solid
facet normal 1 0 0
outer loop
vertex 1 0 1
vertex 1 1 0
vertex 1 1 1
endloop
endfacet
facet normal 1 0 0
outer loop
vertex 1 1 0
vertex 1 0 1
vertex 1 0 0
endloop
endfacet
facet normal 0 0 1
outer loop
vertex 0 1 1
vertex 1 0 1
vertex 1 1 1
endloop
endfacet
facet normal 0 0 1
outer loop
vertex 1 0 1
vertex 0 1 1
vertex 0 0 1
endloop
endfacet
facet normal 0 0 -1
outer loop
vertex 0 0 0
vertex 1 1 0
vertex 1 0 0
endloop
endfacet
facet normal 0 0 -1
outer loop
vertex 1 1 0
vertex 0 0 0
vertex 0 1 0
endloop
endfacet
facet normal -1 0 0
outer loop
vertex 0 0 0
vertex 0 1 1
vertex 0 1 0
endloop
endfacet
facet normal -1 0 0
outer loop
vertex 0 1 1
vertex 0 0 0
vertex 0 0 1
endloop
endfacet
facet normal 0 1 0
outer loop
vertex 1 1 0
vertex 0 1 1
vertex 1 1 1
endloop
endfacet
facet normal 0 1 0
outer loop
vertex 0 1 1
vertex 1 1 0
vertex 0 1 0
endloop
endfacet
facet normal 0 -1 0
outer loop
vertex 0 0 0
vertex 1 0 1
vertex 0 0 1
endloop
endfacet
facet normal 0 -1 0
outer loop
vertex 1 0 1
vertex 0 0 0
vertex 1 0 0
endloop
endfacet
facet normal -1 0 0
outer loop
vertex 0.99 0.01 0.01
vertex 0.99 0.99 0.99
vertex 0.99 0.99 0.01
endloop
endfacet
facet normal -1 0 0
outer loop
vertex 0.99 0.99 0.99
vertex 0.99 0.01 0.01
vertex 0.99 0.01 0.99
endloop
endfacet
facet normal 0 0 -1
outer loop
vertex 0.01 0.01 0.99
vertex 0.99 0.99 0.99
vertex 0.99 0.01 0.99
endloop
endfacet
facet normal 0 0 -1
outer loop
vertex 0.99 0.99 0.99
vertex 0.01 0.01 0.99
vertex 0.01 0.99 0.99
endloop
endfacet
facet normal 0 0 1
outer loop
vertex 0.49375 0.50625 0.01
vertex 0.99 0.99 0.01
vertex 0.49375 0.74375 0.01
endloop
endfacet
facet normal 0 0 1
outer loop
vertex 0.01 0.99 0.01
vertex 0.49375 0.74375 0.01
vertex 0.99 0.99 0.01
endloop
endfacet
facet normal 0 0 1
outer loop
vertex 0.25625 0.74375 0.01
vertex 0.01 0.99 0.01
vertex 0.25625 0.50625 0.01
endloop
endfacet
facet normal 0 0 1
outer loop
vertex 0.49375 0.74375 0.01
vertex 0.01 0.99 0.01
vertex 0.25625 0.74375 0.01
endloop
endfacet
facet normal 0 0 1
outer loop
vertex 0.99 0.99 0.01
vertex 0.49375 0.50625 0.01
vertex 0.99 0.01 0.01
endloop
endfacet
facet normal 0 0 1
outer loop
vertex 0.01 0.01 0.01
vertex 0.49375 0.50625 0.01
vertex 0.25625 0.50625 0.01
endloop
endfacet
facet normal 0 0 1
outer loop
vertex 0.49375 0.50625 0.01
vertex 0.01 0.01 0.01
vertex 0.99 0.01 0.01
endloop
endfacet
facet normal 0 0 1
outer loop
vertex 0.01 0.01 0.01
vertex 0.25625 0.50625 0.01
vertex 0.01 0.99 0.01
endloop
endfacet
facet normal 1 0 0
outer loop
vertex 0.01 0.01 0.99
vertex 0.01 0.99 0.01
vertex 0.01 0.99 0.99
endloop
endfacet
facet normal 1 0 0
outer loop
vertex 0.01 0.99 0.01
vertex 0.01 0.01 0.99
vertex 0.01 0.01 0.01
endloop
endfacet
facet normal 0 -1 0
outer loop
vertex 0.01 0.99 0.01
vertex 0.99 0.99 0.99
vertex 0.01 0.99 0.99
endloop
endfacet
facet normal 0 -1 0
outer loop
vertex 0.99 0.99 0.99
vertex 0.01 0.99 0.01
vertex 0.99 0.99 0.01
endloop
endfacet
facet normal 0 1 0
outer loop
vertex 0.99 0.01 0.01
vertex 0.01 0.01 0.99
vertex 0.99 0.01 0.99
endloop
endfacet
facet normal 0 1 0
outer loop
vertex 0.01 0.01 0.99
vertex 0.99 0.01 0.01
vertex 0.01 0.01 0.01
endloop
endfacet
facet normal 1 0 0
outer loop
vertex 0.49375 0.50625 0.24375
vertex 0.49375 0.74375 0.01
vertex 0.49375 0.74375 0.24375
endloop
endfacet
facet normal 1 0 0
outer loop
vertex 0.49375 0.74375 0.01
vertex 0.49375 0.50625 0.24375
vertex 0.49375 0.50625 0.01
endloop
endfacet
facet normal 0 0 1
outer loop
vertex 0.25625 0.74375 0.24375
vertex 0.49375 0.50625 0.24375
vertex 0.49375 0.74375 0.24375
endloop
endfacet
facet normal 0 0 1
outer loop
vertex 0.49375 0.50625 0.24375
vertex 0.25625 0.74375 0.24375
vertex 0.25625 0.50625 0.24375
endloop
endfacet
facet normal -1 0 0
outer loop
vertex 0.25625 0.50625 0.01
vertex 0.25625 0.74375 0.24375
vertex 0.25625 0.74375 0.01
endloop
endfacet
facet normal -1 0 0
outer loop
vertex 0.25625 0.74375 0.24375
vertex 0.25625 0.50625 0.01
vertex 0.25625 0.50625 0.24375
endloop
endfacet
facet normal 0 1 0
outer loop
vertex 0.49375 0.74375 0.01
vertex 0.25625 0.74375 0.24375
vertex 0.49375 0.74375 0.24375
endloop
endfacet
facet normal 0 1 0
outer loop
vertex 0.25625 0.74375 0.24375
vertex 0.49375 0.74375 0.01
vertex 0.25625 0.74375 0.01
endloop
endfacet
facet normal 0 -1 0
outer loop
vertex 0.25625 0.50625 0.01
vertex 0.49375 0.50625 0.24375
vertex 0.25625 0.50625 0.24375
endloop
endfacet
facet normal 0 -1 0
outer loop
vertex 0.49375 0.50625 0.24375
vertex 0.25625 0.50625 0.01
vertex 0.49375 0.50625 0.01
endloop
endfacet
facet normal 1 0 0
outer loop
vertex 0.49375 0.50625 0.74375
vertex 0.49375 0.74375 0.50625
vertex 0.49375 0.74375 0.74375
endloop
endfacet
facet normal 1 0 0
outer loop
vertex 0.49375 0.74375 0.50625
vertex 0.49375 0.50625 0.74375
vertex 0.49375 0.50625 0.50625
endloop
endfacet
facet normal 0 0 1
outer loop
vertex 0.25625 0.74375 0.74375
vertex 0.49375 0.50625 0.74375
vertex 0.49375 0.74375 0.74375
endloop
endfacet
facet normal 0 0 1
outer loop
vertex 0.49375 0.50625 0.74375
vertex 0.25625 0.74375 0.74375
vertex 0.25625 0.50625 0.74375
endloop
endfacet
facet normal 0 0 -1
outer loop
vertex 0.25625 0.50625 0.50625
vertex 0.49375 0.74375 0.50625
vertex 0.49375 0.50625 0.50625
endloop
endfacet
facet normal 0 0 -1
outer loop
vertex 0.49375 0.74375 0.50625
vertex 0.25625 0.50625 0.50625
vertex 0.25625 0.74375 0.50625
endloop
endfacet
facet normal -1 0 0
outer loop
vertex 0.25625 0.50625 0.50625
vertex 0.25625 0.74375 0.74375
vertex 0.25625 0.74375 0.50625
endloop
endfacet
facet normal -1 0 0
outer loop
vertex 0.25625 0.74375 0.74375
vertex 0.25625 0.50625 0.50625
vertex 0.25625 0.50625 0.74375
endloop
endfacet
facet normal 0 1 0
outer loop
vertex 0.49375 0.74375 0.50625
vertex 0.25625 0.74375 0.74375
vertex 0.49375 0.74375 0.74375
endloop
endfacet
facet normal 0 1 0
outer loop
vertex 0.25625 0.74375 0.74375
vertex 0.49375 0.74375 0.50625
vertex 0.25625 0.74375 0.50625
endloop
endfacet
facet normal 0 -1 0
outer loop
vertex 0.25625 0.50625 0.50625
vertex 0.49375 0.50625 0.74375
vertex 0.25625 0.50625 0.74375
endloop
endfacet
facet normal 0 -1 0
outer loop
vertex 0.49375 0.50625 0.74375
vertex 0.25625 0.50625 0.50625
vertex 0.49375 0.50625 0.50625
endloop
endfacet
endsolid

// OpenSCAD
translate([0.375, 0.625, 0.125]) color([0.6785611781392669, 0.3559530637070777, 0.24479389591231593]) cube([0.2375, 0.2375, 0.2375], center=true);
translate([0.375, 0.625, 0.625]) color([0.19718264729666257, 0.5265513877214916, 0.7820972605832109]) cube([0.2375, 0.2375, 0.2375], center=true);
color([0.3,0.3,0.3,0.3]) difference() { cube([1,1,1]); translate([0.01,0.01,0.01]) cube([0.98,0.98,0.98]); }
